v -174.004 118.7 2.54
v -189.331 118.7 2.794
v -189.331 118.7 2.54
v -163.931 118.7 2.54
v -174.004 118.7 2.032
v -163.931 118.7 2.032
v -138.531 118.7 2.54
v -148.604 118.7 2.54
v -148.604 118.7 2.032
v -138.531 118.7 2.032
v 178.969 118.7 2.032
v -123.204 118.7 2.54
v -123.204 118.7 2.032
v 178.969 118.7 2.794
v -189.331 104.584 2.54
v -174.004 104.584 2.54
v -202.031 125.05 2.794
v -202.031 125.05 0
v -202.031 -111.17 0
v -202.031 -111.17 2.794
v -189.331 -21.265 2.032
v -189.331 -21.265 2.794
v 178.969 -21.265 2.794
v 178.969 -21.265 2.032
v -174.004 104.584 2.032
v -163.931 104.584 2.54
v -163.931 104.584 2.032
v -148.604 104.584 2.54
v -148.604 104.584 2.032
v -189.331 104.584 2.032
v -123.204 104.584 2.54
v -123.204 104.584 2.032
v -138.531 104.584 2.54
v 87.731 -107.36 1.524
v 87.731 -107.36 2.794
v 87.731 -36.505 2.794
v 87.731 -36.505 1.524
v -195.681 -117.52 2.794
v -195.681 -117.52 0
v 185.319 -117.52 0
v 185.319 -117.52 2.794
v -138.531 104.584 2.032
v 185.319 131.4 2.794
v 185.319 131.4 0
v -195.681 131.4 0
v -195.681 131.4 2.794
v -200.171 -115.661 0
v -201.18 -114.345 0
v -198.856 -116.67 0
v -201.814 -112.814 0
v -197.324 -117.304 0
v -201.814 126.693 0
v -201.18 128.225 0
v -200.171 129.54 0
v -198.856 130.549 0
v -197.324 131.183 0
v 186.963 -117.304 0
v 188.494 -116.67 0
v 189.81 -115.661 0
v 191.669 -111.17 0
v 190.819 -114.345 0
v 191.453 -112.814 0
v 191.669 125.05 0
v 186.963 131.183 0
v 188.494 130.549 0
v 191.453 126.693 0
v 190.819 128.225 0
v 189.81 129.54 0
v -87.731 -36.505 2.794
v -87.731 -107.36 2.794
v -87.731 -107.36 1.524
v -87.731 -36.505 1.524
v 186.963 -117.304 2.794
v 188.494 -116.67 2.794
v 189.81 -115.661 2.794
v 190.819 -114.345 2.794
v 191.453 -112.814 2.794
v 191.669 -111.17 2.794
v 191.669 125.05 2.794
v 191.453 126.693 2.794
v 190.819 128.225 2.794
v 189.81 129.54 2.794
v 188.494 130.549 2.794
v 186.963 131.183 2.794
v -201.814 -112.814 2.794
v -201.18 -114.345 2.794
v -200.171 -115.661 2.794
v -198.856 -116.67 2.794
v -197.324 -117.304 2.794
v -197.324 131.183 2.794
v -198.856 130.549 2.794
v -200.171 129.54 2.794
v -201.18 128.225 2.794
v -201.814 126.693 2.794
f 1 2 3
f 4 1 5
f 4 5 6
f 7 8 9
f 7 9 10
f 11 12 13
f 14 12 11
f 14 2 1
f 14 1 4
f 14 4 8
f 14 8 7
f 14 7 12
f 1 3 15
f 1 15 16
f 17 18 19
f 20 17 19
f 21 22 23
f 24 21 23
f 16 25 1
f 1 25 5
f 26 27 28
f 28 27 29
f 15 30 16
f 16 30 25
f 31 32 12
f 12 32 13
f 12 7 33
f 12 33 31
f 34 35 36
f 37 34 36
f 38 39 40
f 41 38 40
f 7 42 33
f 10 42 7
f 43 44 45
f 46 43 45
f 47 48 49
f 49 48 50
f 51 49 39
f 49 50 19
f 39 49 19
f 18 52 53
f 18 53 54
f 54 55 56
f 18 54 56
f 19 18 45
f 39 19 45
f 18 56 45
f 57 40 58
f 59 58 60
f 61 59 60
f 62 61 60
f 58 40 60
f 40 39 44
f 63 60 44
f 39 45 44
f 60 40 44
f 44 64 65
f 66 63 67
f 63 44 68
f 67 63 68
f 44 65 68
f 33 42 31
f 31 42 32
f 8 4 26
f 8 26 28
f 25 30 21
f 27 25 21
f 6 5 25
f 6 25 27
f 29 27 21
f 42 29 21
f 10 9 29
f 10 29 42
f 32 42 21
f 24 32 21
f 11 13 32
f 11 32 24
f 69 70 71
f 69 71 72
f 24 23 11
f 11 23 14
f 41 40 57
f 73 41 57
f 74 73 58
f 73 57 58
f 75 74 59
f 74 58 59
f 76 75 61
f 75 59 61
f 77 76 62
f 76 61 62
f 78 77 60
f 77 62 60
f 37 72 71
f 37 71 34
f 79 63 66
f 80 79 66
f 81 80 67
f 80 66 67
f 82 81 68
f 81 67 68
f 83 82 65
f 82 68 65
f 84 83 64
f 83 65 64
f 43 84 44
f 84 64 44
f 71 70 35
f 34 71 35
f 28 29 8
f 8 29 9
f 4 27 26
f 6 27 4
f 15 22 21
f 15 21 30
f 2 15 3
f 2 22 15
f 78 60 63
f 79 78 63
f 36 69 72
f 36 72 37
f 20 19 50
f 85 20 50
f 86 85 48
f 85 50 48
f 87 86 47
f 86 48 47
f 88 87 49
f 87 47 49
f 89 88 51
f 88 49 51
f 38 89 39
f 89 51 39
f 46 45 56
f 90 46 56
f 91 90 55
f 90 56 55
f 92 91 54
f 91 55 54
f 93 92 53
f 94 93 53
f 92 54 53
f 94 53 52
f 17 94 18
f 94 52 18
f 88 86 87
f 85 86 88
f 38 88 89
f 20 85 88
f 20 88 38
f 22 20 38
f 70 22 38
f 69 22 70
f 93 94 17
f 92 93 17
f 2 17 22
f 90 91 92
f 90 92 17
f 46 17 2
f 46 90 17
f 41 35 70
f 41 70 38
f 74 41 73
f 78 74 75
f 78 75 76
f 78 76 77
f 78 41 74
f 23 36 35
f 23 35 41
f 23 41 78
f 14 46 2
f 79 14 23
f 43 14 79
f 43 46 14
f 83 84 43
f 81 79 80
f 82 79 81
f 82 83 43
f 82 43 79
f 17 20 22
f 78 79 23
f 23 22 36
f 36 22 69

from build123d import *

# Parameters (mm, degrees)
F1_DEPTH = 2.794
F2_W     = 368.3
F2_H     = 139.9649612151
F3_DEPTH = 0.762
F4_W     = 175.4610008955
F4_H     = 70.8550387849
F5_DEPTH = 1.27
F6_W     = 15.326482141
F6_H     = 14.1157105111
F7_DEPTH = 0.508


with BuildPart() as f1:
    # F0 (on Top) → F1 (new body)
    with BuildSketch(Plane.XY):
        with BuildLine():
            ThreePointArc((191.6694995522, 125.0495699547), (189.8096276128, 129.5396980153), (185.3194995522, 131.3995699547))
            Line((185.3194995522, 131.3995699547), (-195.6805004478, 131.3995699547))
            ThreePointArc((-195.6805004478, 131.3995699547), (-200.1706285083, 129.5396980153), (-202.0305004478, 125.0495699547))
            Line((-202.0305004478, 125.0495699547), (-202.0305004478, -111.1704300453))
            ThreePointArc((-202.0305004478, -111.1704300453), (-200.1706285083, -115.6605581058), (-195.6805004478, -117.5204300453))
            Line((-195.6805004478, -117.5204300453), (185.3194995522, -117.5204300453))
            ThreePointArc((185.3194995522, -117.5204300453), (189.8096276128, -115.6605581058), (191.6694995522, -111.1704300453))
            Line((191.6694995522, -111.1704300453), (191.6694995522, 125.0495699547))
        make_face()
    extrude(amount=F1_DEPTH)

    # F2 (on face) → F3 (cut)
    with BuildSketch(Plane.XY.offset(2.794)):
        with Locations((-5.1805004478, 48.7170893472)):
            Rectangle(F2_W, F2_H)
    extrude(amount=-F3_DEPTH, mode=Mode.SUBTRACT)

    # F4 (on face) → F5 (cut)
    with BuildSketch(Plane.XY.offset(2.794)):
        with Locations((0, -71.9329106528)):
            Rectangle(F4_W, F4_H)
    extrude(amount=-F5_DEPTH, mode=Mode.SUBTRACT)

    # F6 (on face) → F7 (join)
    with BuildSketch(Plane.XY.offset(2.032)):
        with Locations((-181.6672593772, 111.6417146992)):
            Rectangle(F6_W, F6_H)
        with Locations((-156.2672593772, 111.6417146992)):
            Rectangle(F6_W, F6_H)
        with Locations((-130.8672593772, 111.6417146992)):
            Rectangle(F6_W, F6_H)
    extrude(amount=F7_DEPTH)


solid = f1.part
